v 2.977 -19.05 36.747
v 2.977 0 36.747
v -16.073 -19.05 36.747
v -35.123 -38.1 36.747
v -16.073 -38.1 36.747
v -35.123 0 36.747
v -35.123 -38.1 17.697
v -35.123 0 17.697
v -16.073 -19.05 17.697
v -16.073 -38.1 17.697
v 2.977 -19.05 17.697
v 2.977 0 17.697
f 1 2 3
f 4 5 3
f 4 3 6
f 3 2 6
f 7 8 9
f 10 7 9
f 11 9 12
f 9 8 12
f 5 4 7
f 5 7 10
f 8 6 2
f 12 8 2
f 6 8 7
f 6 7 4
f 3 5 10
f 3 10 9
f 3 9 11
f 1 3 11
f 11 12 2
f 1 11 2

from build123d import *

# Parameters (mm, degrees)
F0_W     = 19.05
F0_H     = 19.05
F1_DEPTH = 38.1
F2_DEPTH = 19.05
F3_W     = 19.05
F3_H     = 19.05
F4_DEPTH = 25.4


with BuildPart() as f1:
    # F0 (on Front) → F1 (new body)
    with BuildSketch(Plane.XZ):
        with Locations((-25.597605, 27.221616)):
            Rectangle(F0_W, F0_H)
        with Locations((-6.547605, 27.221616)):
            Rectangle(F0_W, F0_H)
    extrude(amount=F1_DEPTH)

    # F0 (on Front) → F2 (join)
    with BuildSketch(Plane.XZ):
        with Locations((-6.547605, 27.221616)):
            Rectangle(F0_W, F0_H)
    extrude(amount=F2_DEPTH)

    # F3 (on face) → F4 (cut)
    with BuildSketch(Plane.XY.offset(36.746616)):
        with Locations((-6.547605, -28.575)):
            Rectangle(F3_W, F3_H)
    extrude(amount=-F4_DEPTH, mode=Mode.SUBTRACT)


solid = f1.part
